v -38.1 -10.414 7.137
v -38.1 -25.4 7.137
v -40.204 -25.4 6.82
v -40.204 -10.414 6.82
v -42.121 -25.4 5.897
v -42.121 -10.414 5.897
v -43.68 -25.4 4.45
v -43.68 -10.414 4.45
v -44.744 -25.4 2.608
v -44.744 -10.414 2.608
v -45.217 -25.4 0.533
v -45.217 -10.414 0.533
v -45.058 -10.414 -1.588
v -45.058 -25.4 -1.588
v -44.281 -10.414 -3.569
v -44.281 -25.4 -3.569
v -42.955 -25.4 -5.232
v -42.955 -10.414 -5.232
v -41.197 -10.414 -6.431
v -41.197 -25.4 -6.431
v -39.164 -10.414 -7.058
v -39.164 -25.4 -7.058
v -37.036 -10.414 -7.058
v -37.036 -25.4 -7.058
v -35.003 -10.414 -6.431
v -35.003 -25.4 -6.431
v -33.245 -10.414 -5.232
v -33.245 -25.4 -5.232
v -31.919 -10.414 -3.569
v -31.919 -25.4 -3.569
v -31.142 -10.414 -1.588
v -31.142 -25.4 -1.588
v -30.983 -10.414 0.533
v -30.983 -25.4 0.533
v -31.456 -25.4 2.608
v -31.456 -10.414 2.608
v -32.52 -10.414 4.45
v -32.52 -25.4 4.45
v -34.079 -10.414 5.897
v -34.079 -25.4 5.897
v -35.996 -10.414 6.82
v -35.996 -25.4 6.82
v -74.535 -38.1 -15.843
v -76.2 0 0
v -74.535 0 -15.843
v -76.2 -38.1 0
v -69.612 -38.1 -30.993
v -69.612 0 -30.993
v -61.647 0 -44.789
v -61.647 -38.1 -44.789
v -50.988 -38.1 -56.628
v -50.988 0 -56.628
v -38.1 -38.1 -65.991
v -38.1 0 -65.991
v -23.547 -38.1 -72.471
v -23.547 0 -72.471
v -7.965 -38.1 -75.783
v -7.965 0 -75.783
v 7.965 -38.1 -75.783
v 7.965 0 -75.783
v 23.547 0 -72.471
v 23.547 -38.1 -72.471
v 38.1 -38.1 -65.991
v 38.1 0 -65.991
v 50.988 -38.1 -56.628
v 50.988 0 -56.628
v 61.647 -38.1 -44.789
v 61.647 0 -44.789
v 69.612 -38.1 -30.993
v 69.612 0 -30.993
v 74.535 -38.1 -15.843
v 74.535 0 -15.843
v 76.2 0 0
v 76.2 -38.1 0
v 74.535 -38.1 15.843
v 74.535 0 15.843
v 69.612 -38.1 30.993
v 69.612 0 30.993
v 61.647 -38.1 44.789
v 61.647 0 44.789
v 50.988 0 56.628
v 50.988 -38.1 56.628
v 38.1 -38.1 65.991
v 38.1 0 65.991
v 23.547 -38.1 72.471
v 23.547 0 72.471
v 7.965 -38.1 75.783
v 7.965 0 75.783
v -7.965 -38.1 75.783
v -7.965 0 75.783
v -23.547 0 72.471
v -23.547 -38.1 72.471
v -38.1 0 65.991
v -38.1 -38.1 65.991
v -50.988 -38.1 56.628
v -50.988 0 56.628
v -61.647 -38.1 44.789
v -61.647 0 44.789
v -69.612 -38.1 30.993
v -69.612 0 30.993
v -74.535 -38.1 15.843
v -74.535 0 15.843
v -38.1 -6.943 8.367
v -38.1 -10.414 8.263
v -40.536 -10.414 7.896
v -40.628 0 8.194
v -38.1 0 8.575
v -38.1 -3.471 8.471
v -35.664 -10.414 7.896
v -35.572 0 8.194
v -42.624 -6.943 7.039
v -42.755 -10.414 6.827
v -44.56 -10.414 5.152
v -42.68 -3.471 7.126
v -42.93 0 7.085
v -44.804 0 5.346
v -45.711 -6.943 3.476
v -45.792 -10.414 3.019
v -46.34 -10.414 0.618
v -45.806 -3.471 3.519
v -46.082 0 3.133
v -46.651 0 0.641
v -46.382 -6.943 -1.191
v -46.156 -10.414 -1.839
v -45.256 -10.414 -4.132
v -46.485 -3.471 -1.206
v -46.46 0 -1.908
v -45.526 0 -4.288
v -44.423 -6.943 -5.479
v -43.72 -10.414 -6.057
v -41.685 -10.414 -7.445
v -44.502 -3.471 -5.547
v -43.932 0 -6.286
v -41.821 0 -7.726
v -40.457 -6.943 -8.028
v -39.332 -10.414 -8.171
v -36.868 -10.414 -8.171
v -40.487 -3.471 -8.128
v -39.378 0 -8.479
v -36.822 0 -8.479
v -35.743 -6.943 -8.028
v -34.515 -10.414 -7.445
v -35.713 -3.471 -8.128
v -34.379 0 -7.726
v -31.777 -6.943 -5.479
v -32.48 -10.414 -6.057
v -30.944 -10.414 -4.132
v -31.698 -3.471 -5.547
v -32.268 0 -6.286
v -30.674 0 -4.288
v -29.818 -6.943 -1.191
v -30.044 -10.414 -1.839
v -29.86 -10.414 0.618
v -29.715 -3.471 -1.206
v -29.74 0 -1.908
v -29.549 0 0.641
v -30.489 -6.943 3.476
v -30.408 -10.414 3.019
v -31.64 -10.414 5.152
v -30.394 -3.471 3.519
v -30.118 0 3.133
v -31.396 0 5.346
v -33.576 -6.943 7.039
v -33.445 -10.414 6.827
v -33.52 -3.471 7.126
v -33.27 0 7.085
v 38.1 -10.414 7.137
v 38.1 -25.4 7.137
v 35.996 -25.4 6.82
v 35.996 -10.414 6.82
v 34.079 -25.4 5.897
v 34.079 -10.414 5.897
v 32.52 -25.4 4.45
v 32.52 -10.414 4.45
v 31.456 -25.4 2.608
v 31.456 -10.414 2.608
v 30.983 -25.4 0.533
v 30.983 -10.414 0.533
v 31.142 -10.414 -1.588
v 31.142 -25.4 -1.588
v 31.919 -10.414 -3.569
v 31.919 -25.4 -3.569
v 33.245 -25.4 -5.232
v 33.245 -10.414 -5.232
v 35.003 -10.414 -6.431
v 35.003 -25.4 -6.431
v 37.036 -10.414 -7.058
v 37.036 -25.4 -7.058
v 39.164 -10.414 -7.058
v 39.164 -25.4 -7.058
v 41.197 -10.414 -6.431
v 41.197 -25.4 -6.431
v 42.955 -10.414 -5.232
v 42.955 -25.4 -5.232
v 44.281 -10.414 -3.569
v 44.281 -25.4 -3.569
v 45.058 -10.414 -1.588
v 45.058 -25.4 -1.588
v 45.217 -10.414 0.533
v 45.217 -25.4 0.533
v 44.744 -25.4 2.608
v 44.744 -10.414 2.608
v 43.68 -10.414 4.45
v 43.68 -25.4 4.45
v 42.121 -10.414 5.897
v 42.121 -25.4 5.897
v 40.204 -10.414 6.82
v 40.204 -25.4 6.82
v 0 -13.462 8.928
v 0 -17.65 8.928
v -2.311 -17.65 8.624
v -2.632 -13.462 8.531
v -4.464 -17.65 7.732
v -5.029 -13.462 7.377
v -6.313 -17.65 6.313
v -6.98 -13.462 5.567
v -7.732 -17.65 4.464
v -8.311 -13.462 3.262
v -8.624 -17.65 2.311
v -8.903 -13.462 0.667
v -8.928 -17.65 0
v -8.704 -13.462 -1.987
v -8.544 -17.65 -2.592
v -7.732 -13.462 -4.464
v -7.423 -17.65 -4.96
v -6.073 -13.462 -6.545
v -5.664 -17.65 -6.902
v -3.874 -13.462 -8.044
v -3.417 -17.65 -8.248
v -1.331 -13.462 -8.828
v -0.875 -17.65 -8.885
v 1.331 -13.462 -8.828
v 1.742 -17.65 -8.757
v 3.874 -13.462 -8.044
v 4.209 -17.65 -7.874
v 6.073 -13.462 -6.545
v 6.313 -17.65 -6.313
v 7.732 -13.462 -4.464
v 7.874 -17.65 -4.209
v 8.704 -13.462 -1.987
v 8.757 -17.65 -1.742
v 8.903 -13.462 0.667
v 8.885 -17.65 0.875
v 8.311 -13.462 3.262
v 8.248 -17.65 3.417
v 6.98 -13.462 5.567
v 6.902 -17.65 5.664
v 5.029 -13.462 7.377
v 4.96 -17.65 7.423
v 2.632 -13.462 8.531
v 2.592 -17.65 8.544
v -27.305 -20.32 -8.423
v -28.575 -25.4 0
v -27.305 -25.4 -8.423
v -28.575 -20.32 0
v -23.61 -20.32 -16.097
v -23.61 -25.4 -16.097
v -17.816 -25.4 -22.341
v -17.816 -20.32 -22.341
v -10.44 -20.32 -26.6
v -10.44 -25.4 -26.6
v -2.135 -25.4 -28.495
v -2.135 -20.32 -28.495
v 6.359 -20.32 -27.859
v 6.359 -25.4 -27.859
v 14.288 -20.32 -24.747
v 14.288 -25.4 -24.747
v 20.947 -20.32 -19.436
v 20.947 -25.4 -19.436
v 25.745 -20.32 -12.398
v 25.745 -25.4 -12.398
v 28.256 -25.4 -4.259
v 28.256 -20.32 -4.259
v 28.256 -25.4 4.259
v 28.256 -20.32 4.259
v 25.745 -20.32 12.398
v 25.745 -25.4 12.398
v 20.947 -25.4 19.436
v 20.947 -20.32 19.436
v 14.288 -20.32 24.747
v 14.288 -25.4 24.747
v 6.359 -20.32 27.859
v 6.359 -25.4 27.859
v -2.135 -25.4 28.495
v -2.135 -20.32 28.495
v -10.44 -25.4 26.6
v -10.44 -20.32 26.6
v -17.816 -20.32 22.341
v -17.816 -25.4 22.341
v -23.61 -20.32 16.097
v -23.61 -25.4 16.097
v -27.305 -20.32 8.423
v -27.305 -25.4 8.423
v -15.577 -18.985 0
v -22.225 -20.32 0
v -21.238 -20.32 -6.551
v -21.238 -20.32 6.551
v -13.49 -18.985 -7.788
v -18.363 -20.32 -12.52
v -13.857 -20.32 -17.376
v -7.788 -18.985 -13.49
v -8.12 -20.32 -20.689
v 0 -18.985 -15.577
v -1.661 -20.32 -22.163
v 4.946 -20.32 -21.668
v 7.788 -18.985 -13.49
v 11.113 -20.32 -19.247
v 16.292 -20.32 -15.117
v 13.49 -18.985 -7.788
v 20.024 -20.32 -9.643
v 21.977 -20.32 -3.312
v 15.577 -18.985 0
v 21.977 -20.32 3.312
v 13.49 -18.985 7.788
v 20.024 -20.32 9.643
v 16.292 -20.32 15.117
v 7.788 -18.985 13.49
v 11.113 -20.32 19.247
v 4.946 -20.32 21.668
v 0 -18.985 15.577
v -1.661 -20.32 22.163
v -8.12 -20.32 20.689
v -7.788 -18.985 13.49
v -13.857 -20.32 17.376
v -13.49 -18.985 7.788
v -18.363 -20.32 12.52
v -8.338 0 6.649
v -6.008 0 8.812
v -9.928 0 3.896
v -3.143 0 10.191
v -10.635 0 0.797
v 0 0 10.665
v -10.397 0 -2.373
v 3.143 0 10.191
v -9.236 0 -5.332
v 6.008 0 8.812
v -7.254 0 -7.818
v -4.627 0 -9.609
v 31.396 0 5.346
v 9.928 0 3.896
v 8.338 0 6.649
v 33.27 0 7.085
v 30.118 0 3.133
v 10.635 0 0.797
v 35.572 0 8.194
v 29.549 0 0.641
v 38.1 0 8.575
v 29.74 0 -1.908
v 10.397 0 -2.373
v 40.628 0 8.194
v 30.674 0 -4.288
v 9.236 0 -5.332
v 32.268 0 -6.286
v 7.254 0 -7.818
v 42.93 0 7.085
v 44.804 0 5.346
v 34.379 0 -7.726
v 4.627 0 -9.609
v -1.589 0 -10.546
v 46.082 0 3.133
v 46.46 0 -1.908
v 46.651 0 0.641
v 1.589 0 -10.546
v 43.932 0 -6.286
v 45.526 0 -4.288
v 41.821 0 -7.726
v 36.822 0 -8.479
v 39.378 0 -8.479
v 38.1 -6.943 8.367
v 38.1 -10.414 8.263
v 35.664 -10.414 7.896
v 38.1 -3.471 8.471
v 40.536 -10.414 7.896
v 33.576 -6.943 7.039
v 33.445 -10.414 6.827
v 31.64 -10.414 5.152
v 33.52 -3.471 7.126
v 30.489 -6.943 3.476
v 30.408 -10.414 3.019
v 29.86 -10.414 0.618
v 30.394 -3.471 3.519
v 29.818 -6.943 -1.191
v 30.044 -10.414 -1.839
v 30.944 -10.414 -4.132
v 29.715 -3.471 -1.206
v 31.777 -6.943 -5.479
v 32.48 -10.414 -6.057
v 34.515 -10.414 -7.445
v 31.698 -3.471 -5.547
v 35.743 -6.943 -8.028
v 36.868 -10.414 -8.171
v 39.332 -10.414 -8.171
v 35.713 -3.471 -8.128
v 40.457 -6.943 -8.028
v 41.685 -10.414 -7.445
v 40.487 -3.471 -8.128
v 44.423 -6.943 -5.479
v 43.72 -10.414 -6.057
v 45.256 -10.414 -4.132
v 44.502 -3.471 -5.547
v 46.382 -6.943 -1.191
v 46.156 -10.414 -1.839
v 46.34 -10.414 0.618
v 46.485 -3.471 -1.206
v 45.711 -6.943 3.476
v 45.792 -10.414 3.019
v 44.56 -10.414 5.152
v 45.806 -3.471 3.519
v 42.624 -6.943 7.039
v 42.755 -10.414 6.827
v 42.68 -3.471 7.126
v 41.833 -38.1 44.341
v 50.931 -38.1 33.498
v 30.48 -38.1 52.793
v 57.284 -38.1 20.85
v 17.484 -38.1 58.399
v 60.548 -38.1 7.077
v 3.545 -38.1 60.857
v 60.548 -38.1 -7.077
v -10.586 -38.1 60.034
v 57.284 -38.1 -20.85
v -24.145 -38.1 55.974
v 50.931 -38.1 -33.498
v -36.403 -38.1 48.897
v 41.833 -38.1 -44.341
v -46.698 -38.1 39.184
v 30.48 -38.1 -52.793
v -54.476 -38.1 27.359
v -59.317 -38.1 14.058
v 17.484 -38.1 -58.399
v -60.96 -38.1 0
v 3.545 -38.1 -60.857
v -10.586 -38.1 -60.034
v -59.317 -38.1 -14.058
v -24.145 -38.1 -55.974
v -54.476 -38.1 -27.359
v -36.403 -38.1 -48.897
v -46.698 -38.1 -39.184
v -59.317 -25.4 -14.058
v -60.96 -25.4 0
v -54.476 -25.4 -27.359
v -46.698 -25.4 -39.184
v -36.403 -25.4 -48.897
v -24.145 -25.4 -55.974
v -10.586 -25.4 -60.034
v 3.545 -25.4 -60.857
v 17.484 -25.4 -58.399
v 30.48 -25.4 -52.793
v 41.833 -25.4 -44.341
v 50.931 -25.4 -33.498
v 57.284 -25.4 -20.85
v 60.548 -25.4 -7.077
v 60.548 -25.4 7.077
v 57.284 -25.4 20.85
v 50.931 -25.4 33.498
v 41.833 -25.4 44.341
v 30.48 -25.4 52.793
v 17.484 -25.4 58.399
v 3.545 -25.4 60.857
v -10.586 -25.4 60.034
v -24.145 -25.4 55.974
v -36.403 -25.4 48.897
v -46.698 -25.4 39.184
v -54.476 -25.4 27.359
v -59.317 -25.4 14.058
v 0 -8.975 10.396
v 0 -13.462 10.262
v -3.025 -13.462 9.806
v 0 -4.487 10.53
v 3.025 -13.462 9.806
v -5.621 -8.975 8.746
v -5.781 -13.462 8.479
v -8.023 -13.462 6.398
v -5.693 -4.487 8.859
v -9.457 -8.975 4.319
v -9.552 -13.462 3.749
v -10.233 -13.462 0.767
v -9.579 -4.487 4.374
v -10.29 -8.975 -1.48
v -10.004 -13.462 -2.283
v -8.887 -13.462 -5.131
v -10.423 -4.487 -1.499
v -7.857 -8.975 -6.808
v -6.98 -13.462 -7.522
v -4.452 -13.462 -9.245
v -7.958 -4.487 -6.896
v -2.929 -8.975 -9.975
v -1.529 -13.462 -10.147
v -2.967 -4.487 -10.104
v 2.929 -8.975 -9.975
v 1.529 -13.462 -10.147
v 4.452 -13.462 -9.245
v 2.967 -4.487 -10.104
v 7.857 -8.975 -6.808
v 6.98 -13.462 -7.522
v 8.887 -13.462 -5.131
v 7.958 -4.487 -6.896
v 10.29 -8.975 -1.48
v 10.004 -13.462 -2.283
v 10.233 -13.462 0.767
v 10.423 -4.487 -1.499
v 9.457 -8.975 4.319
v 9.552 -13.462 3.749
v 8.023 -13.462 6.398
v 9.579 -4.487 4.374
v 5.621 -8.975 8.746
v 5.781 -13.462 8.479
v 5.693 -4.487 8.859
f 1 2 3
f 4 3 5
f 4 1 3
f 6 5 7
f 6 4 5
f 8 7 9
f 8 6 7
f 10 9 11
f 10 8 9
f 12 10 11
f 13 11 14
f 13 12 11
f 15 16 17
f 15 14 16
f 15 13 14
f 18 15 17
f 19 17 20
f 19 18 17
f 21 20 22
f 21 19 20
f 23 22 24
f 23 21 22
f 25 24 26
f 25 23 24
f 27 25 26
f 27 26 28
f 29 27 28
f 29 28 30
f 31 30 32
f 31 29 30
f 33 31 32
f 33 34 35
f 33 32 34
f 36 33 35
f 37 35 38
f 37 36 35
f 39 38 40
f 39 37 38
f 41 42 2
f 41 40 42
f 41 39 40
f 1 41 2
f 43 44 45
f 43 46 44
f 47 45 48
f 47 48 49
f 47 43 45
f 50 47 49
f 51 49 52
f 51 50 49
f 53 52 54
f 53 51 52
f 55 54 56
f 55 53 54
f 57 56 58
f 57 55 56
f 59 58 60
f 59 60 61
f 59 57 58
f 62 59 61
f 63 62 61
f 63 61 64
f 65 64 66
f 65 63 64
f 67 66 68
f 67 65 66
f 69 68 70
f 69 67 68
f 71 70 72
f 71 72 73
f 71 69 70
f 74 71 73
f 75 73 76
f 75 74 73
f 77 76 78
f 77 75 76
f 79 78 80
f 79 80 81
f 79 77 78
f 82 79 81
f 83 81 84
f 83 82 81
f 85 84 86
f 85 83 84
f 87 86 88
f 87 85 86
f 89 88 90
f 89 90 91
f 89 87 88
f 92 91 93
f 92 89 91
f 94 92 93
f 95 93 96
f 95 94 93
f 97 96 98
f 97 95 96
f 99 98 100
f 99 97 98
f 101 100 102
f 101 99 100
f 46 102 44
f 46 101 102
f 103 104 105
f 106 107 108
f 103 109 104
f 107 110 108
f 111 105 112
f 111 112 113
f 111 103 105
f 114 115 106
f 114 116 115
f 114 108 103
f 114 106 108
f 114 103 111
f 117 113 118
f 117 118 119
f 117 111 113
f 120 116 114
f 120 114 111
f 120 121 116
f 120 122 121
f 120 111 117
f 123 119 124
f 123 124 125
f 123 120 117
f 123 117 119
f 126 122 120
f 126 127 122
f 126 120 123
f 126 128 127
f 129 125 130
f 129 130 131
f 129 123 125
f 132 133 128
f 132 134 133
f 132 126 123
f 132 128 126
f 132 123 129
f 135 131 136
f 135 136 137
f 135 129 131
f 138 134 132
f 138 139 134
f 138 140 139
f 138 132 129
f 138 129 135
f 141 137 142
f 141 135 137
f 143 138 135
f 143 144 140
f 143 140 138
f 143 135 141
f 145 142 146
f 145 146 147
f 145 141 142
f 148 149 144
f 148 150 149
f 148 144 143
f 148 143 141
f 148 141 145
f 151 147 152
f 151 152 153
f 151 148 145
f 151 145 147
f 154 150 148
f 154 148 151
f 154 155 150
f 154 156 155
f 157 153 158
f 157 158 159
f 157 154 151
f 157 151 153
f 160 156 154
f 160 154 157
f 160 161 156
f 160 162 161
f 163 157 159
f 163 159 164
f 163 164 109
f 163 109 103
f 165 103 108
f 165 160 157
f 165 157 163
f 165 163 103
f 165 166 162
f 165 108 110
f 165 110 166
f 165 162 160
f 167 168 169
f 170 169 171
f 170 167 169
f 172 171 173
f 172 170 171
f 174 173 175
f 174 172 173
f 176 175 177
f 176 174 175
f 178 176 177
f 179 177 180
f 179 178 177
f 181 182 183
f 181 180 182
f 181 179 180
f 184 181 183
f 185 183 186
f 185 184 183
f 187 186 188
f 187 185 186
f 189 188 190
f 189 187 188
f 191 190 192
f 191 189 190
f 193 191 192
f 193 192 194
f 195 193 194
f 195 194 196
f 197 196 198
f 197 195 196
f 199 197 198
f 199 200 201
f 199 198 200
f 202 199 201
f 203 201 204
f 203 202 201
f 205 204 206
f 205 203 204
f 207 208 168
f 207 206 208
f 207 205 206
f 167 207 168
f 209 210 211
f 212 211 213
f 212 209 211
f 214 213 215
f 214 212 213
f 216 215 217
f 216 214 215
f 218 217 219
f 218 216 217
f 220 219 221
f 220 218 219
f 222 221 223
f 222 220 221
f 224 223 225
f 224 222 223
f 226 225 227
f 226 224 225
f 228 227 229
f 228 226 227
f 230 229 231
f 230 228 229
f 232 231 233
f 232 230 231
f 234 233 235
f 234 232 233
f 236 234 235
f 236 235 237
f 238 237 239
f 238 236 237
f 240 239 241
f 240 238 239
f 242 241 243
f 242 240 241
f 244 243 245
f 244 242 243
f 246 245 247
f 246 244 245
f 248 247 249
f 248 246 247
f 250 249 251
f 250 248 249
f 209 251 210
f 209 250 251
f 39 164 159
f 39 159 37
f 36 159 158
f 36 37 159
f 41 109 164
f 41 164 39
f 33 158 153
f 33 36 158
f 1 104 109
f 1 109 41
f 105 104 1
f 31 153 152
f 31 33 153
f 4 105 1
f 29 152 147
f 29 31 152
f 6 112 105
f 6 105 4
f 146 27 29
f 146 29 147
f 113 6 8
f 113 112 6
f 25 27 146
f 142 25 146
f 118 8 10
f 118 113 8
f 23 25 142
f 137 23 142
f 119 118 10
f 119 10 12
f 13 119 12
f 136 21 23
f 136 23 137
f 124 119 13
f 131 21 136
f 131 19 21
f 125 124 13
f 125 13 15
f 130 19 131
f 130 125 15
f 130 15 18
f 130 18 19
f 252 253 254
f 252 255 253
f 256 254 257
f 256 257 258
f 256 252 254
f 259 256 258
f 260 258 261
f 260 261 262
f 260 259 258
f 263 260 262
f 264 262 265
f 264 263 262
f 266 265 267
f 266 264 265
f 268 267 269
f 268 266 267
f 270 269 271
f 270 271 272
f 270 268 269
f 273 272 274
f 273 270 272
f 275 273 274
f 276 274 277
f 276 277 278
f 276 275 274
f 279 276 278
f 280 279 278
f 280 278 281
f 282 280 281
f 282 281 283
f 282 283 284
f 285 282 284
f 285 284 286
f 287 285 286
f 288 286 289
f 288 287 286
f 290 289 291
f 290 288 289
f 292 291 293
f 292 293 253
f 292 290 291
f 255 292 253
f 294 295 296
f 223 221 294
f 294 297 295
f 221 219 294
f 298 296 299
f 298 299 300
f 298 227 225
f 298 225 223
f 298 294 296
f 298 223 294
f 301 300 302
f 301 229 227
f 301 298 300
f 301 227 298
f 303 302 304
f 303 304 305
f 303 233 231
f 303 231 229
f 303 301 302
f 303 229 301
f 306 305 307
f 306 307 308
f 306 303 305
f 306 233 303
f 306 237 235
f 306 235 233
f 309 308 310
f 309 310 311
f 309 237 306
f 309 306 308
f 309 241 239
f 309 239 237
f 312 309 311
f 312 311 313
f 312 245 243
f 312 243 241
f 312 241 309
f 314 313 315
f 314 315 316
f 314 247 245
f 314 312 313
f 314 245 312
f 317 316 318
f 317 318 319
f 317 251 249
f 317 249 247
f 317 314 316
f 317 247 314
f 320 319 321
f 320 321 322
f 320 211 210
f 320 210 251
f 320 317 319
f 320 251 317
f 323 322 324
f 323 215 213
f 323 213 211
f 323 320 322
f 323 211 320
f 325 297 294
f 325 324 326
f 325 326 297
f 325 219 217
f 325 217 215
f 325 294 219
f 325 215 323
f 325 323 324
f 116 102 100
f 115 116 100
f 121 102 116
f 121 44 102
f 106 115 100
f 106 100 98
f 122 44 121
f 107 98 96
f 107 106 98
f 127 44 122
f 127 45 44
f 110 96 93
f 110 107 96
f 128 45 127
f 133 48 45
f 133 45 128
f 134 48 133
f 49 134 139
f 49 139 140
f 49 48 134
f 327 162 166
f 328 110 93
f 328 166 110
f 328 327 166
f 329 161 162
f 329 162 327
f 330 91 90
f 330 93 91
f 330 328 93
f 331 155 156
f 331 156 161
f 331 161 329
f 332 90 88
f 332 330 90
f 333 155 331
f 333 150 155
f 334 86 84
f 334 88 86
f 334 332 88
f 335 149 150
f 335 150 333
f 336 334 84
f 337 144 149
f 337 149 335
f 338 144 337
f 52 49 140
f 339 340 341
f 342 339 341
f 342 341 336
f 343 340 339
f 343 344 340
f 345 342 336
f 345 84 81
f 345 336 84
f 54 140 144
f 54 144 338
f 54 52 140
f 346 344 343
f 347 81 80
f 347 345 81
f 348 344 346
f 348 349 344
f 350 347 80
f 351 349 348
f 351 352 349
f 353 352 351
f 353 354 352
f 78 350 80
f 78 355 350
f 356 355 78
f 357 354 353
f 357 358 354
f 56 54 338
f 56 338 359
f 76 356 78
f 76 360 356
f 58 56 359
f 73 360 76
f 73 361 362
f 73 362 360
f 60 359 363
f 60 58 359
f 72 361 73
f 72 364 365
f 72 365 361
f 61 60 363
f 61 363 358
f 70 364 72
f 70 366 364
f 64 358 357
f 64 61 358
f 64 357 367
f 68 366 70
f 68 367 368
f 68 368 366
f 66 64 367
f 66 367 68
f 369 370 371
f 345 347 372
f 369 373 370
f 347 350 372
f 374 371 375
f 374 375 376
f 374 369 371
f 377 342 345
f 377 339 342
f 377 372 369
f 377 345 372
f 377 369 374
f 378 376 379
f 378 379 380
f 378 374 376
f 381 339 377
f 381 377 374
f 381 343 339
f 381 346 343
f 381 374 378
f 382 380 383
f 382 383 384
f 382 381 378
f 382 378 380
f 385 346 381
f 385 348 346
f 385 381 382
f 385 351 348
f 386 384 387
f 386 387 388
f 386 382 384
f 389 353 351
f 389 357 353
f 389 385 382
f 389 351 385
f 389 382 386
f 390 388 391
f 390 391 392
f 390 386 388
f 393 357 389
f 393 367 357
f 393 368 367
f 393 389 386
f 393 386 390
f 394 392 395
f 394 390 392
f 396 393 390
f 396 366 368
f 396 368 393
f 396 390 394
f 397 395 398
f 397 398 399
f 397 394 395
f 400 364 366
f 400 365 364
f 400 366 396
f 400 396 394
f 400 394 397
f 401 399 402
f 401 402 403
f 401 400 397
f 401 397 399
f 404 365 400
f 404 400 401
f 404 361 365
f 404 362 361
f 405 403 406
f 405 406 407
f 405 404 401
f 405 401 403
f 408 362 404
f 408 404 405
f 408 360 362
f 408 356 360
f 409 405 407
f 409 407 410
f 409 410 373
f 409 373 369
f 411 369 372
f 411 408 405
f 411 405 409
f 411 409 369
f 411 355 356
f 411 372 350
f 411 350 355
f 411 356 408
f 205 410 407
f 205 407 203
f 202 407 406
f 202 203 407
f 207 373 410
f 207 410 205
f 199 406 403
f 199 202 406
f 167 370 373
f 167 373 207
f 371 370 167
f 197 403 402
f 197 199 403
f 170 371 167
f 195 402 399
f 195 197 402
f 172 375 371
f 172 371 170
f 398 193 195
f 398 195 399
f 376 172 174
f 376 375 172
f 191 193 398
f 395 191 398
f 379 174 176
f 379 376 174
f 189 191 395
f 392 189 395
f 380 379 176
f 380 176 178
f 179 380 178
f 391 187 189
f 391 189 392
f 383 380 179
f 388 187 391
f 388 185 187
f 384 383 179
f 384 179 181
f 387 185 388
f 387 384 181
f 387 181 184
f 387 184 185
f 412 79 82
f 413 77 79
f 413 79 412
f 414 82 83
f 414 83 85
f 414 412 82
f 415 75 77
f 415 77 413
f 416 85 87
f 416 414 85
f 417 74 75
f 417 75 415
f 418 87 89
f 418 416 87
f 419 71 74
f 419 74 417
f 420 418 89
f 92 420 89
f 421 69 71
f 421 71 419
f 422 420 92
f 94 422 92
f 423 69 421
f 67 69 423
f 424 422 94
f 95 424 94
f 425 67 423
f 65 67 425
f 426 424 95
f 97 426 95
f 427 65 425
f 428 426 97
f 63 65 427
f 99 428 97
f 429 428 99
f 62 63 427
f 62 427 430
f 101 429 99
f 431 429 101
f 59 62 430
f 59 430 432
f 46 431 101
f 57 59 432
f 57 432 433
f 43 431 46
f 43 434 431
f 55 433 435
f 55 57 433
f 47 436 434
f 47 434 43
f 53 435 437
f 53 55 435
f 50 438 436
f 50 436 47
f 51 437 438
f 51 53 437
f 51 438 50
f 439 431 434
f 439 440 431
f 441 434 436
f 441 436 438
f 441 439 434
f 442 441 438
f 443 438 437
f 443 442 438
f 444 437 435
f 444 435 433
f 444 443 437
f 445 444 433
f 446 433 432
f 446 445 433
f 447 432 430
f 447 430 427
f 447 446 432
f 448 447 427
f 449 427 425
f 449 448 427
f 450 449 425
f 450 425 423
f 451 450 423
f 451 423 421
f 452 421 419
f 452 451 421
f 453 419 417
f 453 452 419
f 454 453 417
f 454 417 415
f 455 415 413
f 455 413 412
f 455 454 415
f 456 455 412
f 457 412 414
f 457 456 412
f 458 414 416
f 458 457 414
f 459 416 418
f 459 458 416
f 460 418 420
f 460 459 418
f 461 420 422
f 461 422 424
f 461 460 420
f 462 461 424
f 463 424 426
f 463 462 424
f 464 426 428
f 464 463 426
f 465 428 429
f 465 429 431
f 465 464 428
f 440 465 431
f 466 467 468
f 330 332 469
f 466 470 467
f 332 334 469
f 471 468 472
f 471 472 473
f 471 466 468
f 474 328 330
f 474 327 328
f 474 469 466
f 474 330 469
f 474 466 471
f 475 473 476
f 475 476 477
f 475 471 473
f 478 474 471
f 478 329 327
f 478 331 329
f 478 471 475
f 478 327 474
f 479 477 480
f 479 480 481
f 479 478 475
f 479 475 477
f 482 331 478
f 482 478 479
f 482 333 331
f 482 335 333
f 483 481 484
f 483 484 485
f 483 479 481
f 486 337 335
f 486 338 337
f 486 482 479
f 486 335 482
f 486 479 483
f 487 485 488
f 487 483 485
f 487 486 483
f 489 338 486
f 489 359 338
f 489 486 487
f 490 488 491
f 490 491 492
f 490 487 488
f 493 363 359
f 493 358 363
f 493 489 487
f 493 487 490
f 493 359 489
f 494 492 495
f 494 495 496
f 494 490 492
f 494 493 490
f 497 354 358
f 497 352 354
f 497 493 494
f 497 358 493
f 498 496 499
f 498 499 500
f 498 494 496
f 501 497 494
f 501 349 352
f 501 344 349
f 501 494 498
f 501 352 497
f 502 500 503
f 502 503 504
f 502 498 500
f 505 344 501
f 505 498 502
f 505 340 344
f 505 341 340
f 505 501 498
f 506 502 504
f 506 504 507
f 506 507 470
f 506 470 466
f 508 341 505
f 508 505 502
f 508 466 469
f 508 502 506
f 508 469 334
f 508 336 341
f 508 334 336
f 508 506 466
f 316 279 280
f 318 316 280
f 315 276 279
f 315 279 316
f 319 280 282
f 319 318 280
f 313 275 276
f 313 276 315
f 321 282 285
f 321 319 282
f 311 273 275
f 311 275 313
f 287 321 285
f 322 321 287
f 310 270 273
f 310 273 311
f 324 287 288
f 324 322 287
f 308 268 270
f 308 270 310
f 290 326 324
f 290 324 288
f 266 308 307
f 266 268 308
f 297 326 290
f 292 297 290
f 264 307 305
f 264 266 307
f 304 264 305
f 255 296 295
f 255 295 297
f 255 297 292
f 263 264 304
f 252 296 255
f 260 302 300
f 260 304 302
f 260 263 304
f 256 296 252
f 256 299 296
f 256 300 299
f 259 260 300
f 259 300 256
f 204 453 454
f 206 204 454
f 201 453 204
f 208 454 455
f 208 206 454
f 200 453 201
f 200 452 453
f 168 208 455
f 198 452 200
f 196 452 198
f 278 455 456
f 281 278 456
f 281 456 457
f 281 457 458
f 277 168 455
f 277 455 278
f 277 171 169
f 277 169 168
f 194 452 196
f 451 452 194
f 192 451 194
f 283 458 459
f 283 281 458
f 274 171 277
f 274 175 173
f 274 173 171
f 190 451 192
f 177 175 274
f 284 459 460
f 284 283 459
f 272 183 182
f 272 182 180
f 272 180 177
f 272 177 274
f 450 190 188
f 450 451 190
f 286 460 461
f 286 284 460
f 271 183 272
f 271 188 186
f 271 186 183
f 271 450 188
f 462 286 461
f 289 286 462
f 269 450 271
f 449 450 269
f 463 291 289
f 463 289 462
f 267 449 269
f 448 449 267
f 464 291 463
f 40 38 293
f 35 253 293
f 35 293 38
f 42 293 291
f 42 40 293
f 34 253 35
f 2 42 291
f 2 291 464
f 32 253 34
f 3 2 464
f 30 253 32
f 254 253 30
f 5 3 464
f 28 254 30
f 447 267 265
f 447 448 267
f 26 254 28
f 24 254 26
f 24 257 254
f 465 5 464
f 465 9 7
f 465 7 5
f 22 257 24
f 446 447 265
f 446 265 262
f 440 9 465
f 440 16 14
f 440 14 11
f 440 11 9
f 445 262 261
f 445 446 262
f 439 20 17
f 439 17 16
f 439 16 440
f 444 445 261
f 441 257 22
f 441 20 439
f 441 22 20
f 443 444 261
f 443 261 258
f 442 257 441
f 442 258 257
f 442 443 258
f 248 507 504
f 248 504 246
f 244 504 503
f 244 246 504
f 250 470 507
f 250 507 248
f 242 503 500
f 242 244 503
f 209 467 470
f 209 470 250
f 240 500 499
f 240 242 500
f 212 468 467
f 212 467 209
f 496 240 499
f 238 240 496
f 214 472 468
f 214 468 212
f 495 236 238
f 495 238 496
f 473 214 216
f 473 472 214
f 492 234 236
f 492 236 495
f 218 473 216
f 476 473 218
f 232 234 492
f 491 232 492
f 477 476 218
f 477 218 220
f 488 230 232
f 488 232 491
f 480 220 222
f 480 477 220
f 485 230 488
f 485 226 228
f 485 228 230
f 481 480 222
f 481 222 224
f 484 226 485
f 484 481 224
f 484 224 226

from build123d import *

# Parameters (mm, degrees)
F_3_8_NPT_TAPPED_HOLE1_AT_2_COUNT = 2
F_3_8_NPT_TAPPED_HOLE1_AT_2_PITCH = 76.2


with BuildPart() as part:
    # Sketch1 → Revolve1 (revolve)
    with BuildSketch(Plane.XY):
        Polygon((0, 0), (-76.2, 0), (-76.2, -38.1), (-60.96, -38.1), (-60.96, -25.4), (-28.575, -25.4), (-28.575, -20.32), (-22.225, -20.32), (0, -15.85722), align=None)
    revolve(axis=Axis((0, 0, 0), (0, -1, 0)))

    # Sketch3 → 1/2 NPT Tapped Hole1 (revolve, cut)
    with BuildSketch(Plane(origin=(0, 0, 0), x_dir=(0, 0, 1), z_dir=(1, 0, 0))):
        Polygon((0, 0), (0, 38.1), (8.9281, 38.1), (8.9281, 13.462), (10.261665792, 13.462), (10.6647361, 0), align=None)
    revolve(axis=Axis((0, 6.35, 0), (0, -1, 0)), mode=Mode.SUBTRACT)

    # Sketch5 → 3/8 NPT Tapped Hole1 (revolve, cut)
    with BuildSketch(Plane(origin=(-38.1, 0, 0), x_dir=(0, 0, 1), z_dir=(1, 0, 0))):
        Polygon((0, 0), (0, 38.1), (7.1374, 38.1), (7.1374, 10.414), (8.263205494, 10.414), (8.5750146, 0), align=None)
    f_3_8_npt_tapped_hole1 = revolve(axis=Axis((-38.1, 6.35, 0), (0, -1, 0)), mode=Mode.SUBTRACT)

    # 3/8 NPT Tapped Hole1 at 2: 3/8 NPT Tapped Hole1 ×2
    with Locations(*[(i * F_3_8_NPT_TAPPED_HOLE1_AT_2_PITCH, 0, 0) for i in range(1, F_3_8_NPT_TAPPED_HOLE1_AT_2_COUNT)]):
        add(f_3_8_npt_tapped_hole1, mode=Mode.SUBTRACT)


solid = part.part
